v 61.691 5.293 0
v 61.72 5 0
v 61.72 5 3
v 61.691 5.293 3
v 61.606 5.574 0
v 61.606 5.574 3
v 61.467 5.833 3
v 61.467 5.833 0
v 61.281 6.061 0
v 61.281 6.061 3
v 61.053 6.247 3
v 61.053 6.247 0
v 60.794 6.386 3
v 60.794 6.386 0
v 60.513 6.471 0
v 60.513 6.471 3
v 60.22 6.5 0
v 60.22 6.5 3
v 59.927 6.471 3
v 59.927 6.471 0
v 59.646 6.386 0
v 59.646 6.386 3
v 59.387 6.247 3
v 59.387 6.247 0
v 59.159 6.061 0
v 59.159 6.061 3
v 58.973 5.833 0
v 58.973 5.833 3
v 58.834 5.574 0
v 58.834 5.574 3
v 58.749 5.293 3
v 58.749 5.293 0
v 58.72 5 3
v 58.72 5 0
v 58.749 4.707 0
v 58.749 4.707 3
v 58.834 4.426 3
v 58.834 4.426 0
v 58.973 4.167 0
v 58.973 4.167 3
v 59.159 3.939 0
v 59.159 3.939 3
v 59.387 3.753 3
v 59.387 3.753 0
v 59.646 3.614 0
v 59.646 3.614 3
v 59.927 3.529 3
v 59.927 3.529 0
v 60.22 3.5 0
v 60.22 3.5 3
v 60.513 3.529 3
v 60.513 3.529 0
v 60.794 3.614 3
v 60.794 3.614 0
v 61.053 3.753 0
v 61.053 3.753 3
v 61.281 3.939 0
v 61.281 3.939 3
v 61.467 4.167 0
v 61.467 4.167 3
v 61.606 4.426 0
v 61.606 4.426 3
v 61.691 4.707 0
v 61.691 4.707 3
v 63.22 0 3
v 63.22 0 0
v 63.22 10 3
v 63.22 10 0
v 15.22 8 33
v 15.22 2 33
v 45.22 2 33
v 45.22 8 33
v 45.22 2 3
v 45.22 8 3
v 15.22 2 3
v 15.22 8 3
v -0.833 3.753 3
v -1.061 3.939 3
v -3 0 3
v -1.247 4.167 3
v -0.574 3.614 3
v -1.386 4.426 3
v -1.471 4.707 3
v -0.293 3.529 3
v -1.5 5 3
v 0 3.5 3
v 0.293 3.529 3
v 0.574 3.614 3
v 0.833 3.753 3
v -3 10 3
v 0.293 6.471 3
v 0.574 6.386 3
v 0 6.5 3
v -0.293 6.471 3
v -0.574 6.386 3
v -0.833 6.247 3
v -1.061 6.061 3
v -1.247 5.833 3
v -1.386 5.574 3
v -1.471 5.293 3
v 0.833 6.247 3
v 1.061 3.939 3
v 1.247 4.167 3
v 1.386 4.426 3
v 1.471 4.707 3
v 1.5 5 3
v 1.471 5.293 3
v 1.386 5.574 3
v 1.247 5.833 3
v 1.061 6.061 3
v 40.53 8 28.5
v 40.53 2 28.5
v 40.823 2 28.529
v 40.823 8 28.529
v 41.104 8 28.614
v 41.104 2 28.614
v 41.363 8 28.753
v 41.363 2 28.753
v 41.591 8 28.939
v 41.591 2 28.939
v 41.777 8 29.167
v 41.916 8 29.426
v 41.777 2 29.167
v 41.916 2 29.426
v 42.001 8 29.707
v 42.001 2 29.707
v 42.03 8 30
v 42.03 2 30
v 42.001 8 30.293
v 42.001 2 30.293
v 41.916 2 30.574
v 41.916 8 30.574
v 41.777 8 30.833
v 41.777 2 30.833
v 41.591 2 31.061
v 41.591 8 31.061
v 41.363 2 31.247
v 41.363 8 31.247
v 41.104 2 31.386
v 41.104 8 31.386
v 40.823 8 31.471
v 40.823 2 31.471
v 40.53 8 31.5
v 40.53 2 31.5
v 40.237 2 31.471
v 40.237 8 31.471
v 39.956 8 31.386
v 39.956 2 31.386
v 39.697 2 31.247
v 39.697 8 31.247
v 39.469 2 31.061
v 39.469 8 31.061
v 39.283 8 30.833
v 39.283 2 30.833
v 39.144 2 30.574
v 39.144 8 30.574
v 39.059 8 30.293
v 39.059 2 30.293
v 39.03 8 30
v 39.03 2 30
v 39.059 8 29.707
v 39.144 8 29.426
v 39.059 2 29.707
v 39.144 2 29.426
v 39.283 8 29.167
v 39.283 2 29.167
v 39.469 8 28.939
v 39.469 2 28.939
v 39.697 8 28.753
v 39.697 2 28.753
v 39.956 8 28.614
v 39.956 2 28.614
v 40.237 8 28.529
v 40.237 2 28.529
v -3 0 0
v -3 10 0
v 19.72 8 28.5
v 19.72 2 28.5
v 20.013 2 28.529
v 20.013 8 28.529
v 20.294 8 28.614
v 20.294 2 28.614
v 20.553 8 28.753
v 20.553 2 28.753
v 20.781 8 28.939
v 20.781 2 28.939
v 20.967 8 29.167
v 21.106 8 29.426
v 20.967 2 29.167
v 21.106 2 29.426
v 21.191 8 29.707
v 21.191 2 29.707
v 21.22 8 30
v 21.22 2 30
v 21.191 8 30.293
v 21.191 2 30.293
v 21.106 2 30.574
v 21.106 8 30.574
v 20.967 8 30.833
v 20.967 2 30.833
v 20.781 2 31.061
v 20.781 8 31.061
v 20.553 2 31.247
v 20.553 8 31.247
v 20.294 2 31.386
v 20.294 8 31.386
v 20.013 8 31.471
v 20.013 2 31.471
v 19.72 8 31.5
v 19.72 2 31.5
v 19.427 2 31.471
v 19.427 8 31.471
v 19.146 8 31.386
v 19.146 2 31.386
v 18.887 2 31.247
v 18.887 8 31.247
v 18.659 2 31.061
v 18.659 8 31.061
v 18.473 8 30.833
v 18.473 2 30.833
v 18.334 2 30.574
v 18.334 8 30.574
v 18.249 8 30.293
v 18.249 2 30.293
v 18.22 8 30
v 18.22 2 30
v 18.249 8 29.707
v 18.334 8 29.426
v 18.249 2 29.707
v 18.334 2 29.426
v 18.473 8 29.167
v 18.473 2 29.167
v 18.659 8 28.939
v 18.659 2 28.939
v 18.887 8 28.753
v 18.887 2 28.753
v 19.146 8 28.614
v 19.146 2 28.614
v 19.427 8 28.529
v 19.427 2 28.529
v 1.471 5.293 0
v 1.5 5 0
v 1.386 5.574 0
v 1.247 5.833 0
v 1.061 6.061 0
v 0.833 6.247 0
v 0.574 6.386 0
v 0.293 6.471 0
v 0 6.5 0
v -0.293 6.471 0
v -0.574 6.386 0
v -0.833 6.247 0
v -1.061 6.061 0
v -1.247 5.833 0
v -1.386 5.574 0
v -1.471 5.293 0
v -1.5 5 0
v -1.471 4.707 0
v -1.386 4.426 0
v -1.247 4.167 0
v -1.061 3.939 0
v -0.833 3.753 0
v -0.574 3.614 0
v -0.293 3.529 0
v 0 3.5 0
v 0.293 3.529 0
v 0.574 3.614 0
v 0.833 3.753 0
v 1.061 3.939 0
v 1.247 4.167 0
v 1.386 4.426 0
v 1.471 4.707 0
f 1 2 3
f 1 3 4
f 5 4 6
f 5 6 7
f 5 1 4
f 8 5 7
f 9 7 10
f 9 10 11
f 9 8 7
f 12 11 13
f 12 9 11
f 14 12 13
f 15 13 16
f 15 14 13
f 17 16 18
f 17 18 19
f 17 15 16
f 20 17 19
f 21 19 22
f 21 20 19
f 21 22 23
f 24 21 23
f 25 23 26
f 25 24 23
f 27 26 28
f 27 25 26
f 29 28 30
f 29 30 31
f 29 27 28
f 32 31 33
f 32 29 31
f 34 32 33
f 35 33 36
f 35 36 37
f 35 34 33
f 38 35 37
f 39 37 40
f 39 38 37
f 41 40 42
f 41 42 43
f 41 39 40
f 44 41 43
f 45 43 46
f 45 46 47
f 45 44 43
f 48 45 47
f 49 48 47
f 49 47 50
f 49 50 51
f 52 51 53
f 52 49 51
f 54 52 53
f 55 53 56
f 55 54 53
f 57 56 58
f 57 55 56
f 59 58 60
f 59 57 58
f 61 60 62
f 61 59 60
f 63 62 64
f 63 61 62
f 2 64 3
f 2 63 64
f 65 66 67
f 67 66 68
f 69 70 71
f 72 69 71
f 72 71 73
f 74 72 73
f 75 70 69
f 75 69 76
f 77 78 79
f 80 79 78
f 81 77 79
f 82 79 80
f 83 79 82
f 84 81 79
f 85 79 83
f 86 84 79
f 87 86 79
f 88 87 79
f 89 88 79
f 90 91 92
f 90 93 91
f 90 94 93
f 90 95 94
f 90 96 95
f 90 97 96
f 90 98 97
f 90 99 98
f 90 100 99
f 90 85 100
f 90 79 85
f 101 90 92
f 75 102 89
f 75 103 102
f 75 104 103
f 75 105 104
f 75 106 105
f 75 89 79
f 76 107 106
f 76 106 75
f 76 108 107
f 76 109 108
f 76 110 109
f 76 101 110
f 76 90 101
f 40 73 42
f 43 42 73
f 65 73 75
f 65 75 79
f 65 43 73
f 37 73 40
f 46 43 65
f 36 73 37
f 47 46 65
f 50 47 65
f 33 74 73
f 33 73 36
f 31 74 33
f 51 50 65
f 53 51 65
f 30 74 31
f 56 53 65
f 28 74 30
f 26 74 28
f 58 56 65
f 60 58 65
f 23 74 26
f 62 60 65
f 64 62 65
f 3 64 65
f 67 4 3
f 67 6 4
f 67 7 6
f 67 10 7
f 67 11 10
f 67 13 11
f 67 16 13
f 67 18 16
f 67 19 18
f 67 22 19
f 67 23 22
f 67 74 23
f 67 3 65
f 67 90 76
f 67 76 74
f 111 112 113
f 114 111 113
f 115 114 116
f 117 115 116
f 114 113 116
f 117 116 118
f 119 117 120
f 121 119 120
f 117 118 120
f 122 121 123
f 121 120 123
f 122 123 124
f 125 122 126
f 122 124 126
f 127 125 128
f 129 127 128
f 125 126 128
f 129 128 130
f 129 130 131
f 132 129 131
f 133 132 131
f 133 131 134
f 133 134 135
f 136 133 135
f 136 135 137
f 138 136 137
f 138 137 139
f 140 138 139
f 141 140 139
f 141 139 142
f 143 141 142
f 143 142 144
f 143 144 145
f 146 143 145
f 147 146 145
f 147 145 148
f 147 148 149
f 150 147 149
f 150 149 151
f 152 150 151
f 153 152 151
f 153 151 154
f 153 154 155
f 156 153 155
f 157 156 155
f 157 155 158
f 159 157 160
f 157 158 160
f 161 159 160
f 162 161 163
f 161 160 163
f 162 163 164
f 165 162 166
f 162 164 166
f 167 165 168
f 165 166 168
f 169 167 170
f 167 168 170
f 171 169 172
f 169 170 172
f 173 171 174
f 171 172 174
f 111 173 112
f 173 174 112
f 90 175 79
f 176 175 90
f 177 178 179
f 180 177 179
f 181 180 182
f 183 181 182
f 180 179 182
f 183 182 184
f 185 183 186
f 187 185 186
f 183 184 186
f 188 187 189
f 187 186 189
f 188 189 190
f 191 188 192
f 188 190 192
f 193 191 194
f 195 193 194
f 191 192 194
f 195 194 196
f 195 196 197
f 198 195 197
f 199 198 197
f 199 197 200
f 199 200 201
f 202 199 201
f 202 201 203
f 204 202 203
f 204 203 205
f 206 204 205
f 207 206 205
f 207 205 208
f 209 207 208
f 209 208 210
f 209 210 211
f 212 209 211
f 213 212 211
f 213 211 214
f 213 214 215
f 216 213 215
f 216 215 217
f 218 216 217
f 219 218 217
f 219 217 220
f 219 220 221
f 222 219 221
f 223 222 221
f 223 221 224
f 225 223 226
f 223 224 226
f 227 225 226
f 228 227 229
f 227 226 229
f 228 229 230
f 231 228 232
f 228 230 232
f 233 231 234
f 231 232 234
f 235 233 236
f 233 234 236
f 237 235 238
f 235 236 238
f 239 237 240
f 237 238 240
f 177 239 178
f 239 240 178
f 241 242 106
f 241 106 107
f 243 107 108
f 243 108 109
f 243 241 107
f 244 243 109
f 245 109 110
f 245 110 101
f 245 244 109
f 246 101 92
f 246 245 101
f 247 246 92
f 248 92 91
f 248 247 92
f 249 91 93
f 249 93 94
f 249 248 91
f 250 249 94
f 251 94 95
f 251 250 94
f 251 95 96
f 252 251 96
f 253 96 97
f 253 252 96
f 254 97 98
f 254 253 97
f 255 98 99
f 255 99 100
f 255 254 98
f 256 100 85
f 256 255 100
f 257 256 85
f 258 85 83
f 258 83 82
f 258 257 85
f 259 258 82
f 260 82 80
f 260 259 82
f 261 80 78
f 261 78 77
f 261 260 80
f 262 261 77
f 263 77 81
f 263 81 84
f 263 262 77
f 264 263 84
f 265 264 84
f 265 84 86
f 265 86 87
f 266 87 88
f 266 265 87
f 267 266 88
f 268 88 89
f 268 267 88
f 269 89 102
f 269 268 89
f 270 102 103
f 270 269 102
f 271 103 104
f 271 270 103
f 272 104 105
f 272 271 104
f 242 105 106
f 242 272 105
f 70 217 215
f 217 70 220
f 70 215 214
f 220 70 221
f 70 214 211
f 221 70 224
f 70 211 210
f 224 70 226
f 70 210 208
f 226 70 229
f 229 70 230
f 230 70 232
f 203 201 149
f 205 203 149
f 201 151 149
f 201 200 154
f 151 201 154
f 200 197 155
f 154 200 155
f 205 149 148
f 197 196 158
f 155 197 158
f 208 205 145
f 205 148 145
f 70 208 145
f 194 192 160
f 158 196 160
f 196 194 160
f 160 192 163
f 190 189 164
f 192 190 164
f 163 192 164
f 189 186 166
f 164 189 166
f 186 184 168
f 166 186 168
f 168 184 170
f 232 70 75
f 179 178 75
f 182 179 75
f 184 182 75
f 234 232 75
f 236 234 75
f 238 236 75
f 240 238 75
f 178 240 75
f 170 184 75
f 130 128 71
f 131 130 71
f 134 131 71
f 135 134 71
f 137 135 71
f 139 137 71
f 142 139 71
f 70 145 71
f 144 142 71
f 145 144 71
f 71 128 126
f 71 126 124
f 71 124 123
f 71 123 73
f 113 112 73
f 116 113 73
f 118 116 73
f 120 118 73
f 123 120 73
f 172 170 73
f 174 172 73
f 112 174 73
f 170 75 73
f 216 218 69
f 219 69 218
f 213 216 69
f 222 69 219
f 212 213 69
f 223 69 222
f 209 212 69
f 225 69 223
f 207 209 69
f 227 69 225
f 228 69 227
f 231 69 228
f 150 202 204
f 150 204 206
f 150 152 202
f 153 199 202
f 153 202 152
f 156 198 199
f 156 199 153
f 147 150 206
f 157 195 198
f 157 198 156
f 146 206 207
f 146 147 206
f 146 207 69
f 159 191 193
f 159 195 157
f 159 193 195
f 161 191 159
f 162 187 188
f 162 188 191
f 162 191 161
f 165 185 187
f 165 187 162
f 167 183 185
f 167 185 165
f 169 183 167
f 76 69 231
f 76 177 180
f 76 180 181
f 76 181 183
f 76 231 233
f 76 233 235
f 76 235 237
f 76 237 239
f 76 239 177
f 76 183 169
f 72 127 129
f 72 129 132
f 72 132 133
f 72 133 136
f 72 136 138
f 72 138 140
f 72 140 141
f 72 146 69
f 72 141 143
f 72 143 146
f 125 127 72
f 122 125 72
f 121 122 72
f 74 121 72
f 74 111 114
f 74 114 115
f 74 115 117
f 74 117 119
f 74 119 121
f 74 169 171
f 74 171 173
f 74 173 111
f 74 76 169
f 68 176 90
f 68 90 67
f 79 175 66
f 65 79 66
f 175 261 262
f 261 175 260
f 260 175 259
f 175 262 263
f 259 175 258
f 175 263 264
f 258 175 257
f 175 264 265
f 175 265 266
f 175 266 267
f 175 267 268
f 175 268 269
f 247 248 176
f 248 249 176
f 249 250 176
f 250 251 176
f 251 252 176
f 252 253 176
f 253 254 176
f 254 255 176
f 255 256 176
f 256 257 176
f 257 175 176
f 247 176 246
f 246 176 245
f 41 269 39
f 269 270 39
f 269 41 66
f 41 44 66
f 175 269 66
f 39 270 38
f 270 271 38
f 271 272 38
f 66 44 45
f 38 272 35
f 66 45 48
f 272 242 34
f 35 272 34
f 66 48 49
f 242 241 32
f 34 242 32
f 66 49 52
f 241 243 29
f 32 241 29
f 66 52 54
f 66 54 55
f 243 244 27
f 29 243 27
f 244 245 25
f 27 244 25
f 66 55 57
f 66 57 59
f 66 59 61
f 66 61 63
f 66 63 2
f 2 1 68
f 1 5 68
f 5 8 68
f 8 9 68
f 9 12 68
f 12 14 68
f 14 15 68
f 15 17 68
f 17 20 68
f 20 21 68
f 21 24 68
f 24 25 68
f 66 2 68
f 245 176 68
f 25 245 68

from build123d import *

# Parameters (mm, degrees)
SKETCH1_W                = 66.22
SKETCH1_H                = 10
SKETCH1_R                = 1.5
BOSS_EXTRUDE1_DEPTH      = 3
BOSS_EXTRUDE2_DEPTH      = 3
BOSS_EXTRUDE2_DEPTH_BACK = 3
SKETCH2_W                = 30
SKETCH2_H                = 30
SKETCH3_R                = 1.5
CUT_EXTRUDE1_DEPTH       = 72.76188682


with BuildPart() as part:
    # Sketch1 → Boss-Extrude1 (new body)
    with BuildSketch(Plane.XY):
        with Locations((30.11, 5)):
            Rectangle(SKETCH1_W, SKETCH1_H)
        with Locations((0, 5)):
            Circle(SKETCH1_R, mode=Mode.SUBTRACT)
        with Locations((60.22, 5)):
            Circle(SKETCH1_R, mode=Mode.SUBTRACT)
    extrude(amount=BOSS_EXTRUDE1_DEPTH)

    # Sketch2 → Boss-Extrude2 (add, two sides: drawn at the far end of the back side and taken through both)
    with BuildSketch(Plane(origin=(0, 5, 0), x_dir=(1, 0, 0), z_dir=(0, 1, 0)).offset(-BOSS_EXTRUDE2_DEPTH_BACK)):
        with Locations((30.22, -18)):
            Rectangle(SKETCH2_W, SKETCH2_H)
    extrude(amount=BOSS_EXTRUDE2_DEPTH + BOSS_EXTRUDE2_DEPTH_BACK)

    # Sketch3 → Cut-Extrude1 (cut, through all)
    with BuildSketch(Plane.XZ.offset(-2)):
        with Locations(Location((19.72, 30, 0), (0, 0, 270))):
            Circle(SKETCH3_R)
        with Locations(Location((40.53, 30, 0), (0, 0, 270))):
            Circle(SKETCH3_R)
    extrude(amount=-CUT_EXTRUDE1_DEPTH, mode=Mode.SUBTRACT)


solid = part.part
